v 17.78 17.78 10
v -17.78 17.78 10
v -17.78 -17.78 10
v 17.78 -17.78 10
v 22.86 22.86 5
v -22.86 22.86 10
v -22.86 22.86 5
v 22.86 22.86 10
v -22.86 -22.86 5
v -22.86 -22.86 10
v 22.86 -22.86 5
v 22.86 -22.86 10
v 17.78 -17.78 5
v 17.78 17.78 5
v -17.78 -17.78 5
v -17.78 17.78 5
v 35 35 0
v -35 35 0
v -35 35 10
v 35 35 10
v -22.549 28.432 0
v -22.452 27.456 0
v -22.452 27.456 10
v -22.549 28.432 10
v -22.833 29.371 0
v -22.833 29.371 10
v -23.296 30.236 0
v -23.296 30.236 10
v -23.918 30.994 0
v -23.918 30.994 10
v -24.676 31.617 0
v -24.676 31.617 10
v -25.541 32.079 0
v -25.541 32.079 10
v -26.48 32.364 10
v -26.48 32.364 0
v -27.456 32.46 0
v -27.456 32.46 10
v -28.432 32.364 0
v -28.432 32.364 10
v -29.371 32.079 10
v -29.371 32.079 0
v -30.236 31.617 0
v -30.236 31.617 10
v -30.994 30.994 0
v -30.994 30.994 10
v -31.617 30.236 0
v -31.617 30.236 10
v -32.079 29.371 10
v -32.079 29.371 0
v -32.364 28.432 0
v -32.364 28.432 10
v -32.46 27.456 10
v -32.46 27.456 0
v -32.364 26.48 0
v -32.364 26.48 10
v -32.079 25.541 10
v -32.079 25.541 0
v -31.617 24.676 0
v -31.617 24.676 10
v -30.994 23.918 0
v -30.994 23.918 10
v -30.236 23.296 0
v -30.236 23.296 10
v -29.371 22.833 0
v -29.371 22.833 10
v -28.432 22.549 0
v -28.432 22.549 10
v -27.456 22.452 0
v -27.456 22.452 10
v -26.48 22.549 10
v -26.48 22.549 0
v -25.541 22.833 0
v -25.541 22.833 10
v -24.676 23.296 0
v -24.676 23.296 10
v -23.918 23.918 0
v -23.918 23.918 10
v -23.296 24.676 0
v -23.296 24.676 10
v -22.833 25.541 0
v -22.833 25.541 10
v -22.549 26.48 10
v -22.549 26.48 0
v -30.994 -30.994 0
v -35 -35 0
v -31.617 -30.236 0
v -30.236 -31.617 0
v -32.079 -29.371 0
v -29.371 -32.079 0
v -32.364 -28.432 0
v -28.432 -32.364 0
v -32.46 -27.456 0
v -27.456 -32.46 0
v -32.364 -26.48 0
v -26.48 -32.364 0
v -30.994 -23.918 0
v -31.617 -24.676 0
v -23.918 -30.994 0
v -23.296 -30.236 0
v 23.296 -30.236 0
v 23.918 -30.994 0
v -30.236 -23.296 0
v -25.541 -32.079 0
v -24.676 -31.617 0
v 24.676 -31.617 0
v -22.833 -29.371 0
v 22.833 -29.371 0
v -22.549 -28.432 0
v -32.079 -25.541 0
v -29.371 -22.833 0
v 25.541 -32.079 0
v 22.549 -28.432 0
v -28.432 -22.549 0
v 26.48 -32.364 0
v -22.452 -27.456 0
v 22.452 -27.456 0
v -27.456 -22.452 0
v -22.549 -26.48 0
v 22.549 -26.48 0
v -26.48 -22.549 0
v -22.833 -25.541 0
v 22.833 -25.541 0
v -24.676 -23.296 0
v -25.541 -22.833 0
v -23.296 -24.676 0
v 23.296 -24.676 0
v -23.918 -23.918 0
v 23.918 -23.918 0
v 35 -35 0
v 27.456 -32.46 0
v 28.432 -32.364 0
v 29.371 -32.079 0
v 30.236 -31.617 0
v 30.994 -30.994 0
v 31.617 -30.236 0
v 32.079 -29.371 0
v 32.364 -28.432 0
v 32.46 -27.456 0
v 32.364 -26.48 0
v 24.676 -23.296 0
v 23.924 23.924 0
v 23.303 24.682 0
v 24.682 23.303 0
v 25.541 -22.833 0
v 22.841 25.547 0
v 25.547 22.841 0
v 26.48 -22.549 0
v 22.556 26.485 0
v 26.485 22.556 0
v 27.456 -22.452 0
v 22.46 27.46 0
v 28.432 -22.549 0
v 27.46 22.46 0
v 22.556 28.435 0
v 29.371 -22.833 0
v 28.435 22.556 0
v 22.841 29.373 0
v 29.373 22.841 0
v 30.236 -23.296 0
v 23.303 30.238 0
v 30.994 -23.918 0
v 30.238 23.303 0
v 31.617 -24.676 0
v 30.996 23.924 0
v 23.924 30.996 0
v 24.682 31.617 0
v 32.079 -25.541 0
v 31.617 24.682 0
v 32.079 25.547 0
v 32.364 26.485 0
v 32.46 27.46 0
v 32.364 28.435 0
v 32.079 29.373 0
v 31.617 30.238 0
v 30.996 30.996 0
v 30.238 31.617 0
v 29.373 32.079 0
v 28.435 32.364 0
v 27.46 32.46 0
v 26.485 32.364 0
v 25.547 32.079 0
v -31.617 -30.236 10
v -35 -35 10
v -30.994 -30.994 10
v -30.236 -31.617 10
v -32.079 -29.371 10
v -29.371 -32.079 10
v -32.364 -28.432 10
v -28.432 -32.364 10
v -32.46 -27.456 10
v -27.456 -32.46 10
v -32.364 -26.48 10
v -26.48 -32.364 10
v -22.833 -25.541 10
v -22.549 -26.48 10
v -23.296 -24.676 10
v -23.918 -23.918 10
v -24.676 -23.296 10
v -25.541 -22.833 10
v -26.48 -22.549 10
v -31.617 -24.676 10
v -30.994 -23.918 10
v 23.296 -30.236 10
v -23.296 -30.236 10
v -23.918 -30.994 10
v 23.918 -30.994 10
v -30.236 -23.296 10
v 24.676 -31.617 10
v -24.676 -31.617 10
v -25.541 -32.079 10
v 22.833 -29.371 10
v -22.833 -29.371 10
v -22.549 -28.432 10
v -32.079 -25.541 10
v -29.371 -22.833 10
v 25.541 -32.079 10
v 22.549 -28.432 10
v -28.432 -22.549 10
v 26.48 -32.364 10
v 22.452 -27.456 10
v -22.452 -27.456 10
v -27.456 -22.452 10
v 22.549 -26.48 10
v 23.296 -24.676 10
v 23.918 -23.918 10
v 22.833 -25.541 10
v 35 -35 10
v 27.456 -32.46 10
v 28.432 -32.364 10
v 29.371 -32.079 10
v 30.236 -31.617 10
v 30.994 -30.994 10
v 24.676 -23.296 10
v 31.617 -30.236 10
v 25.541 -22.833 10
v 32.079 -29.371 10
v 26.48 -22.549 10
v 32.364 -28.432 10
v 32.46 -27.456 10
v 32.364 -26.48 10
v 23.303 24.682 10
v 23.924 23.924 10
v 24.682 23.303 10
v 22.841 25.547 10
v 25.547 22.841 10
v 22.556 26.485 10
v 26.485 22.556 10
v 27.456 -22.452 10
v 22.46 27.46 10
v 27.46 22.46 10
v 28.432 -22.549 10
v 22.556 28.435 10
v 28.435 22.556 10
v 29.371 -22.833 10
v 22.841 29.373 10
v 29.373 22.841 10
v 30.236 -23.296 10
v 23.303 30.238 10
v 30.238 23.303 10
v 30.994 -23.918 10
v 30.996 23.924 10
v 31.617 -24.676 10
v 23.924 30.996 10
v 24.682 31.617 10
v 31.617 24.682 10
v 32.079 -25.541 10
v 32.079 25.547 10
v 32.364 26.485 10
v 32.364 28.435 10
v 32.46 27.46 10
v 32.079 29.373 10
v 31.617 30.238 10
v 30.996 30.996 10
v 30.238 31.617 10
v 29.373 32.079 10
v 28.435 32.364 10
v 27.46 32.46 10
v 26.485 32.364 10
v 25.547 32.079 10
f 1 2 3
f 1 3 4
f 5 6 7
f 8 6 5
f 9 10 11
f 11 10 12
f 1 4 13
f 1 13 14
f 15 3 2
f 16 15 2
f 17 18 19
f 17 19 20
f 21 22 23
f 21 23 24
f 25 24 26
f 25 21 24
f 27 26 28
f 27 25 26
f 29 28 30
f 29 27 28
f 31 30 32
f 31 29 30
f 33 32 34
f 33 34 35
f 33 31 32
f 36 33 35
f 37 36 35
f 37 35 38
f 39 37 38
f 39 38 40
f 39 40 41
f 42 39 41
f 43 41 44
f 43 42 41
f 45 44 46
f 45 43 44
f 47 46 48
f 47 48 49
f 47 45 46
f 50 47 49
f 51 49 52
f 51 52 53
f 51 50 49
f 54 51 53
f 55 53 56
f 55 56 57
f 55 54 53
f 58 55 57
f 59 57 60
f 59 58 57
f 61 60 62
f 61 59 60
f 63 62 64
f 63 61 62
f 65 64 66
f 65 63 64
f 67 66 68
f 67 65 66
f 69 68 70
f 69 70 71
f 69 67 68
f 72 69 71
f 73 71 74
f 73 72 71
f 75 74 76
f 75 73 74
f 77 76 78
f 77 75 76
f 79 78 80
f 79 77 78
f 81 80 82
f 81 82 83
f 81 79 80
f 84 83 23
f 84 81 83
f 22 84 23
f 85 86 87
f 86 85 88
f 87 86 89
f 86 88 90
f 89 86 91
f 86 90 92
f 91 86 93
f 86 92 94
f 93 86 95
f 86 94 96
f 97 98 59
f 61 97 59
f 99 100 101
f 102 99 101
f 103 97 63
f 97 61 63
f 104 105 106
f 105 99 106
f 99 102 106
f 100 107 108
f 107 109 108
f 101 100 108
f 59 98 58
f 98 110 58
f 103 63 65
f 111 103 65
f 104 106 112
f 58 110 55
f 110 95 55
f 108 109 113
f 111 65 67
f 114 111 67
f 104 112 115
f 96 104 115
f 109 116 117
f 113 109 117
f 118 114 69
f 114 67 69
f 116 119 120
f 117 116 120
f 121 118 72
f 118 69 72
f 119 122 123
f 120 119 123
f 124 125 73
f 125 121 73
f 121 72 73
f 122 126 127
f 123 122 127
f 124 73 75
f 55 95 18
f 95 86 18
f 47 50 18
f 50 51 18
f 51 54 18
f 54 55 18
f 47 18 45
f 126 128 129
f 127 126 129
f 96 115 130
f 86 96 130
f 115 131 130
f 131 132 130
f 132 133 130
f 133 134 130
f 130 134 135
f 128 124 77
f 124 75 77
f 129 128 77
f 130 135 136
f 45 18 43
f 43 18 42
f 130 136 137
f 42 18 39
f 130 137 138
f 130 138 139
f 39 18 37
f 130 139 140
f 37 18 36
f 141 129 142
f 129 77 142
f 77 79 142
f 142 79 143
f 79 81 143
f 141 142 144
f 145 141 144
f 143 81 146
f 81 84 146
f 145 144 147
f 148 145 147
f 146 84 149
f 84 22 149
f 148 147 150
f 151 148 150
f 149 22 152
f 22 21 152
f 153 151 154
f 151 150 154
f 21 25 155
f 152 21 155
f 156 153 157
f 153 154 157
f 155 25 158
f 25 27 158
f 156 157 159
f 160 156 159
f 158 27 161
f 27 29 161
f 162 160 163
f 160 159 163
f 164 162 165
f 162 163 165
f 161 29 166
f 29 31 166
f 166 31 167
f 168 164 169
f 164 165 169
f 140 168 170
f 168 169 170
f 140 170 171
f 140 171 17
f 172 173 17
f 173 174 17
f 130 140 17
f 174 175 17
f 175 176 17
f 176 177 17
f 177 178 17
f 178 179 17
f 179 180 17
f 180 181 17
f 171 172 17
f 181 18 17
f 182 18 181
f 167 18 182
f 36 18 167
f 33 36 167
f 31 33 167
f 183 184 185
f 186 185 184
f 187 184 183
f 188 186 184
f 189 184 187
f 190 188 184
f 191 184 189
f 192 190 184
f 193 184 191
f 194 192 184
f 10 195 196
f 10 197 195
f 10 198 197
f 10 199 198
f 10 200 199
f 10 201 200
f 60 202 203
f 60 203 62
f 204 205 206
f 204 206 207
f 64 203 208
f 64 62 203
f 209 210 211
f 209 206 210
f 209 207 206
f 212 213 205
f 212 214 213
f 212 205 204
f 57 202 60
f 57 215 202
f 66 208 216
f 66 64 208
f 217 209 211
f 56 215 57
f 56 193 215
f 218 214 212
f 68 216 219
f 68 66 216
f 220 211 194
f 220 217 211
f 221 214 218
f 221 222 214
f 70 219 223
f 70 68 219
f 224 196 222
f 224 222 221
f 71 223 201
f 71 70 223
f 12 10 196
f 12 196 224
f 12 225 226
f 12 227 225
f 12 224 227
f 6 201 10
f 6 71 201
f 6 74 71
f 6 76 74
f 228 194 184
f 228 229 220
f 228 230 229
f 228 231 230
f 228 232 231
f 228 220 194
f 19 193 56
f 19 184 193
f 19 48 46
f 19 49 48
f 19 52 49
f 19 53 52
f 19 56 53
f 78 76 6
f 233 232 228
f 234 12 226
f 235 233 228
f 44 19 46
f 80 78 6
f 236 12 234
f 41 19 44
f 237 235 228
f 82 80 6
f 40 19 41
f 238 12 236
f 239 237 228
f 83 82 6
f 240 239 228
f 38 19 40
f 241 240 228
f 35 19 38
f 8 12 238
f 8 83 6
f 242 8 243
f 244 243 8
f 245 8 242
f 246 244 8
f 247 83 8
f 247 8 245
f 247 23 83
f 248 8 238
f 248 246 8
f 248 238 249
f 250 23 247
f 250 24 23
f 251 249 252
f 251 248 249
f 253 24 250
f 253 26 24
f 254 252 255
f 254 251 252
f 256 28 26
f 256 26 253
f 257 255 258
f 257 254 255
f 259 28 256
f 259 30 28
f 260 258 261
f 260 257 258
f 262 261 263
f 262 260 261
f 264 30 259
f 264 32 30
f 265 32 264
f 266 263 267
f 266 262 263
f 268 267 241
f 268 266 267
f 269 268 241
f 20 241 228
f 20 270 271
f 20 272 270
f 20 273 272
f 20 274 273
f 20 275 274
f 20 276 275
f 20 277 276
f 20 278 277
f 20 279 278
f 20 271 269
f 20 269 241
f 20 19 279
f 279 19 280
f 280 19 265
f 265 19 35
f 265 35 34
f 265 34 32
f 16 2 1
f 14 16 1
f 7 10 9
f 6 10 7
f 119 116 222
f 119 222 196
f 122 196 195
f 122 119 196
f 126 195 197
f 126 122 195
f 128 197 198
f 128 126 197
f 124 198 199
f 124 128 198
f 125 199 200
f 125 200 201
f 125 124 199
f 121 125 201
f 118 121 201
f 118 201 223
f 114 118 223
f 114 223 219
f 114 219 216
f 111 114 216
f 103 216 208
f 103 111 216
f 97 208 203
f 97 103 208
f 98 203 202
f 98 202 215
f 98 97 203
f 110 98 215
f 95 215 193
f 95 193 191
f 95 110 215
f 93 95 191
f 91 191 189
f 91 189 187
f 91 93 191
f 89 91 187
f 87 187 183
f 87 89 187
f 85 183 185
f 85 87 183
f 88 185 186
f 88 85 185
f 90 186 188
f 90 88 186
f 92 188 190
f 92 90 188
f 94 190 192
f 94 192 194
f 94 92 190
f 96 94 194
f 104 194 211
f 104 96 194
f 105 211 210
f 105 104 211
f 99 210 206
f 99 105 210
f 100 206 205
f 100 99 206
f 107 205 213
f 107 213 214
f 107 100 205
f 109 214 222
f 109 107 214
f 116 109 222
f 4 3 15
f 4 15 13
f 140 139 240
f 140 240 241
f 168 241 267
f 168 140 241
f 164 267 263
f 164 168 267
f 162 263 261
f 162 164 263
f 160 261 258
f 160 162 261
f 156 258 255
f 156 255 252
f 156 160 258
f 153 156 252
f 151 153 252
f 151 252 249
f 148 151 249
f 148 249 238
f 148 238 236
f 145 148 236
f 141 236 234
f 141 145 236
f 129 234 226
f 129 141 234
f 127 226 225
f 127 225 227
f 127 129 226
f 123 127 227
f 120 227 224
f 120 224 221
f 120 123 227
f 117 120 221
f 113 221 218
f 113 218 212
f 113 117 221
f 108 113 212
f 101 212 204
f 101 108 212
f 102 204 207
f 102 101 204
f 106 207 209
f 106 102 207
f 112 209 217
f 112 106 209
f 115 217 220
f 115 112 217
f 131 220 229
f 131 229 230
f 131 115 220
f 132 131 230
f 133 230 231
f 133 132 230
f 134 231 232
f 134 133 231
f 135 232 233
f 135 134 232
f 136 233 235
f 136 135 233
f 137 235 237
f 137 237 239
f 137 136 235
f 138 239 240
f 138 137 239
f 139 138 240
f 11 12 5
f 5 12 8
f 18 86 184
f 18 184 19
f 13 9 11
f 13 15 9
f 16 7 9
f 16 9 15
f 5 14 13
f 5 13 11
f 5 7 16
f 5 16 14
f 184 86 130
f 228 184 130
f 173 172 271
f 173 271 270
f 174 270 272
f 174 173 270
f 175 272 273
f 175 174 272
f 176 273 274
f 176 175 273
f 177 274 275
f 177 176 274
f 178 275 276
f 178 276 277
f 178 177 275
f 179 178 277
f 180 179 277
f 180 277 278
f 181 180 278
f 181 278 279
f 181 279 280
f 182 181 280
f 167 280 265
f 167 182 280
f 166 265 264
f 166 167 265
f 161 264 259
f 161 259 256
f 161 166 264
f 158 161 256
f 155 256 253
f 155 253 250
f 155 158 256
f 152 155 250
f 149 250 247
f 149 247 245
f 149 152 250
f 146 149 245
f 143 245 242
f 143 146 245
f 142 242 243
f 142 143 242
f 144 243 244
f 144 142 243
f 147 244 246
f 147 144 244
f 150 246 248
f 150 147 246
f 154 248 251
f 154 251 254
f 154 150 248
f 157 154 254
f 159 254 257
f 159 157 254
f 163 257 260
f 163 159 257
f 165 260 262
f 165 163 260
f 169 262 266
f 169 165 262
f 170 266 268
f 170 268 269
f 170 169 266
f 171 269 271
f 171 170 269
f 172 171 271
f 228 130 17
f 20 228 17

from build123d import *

# Parameters (mm, degrees)
F0_W     = 70
F0_H     = 70
F0_R     = 5.0038
F0_R_2   = 5
F1_DEPTH = 10
F2_W     = 45.72
F2_H     = 45.72
F2_W_2   = 35.56
F2_H_2   = 35.56
F3_DEPTH = 5


with BuildPart() as f1:
    # F0 (on Top) → F1 (new body)
    with BuildSketch(Plane.XY):
        Rectangle(F0_W, F0_H)
        with Locations((-27.4562, -27.4562)):
            Circle(F0_R, mode=Mode.SUBTRACT)
        with Locations((27.4562, -27.4562)):
            Circle(F0_R, mode=Mode.SUBTRACT)
        with Locations((-27.4562, 27.4562)):
            Circle(F0_R, mode=Mode.SUBTRACT)
        with Locations((27.46, 27.46)):
            Circle(F0_R_2, mode=Mode.SUBTRACT)
    extrude(amount=F1_DEPTH)

    # F2 (on face) → F3 (cut)
    with BuildSketch(Plane.XY.offset(10)):
        Rectangle(F2_W, F2_H)
        Rectangle(F2_W_2, F2_H_2, mode=Mode.SUBTRACT)
    extrude(amount=-F3_DEPTH, mode=Mode.SUBTRACT)


solid = f1.part
